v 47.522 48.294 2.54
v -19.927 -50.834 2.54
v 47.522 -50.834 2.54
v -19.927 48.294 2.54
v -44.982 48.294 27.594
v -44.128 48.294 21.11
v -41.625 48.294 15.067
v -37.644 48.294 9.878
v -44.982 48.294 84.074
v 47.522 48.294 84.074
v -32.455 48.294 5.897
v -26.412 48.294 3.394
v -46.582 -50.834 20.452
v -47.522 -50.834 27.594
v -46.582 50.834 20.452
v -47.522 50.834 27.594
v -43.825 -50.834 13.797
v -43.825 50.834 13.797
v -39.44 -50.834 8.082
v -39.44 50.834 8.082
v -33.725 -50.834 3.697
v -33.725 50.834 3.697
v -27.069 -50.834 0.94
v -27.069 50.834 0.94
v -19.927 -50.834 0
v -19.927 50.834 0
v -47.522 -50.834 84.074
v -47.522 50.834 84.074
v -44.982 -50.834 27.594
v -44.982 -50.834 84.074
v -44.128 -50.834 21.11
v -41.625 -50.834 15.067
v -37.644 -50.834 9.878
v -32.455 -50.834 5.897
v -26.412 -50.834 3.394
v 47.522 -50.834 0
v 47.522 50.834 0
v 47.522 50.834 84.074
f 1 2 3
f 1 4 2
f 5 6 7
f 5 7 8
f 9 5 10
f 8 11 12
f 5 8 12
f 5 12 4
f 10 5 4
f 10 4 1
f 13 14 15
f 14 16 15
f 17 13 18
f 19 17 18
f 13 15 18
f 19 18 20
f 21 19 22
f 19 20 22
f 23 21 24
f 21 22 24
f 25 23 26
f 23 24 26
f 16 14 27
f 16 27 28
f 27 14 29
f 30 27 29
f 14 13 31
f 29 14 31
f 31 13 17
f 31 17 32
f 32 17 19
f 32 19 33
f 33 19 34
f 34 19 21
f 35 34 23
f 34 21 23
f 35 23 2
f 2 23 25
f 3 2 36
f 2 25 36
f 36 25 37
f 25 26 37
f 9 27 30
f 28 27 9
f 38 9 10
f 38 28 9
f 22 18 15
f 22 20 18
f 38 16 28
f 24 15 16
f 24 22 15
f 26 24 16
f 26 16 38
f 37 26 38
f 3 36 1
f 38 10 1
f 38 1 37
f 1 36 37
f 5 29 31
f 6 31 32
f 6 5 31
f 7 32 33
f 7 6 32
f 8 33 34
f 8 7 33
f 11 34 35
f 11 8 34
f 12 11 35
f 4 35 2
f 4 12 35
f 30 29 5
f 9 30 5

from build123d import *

# Parameters (mm, degrees)
F0_W     = 95.043734
F0_H     = 101.66876
F1_DEPTH = 84.074
F2_R     = 27.594461
F3_T     = -2.54


with BuildPart() as f1:
    # F0 (on Top) → F1 (new body)
    with BuildSketch(Plane.XY):
        Rectangle(F0_W, F0_H)
    extrude(amount=F1_DEPTH)

    # F2
    f2_edges = [f1.edges().sort_by_distance(p)[0] for p in [
        (-47.521867, 0, 0),
    ]]
    fillet(f2_edges, radius=F2_R)

    # F3
    f3_openings = [f1.faces().sort_by_distance(p)[0] for p in [
        (0.863429, -50.83438, 42.785922),
        (0, 0, 84.074),
        (47.521867, 0, 42.037),
    ]]
    offset(amount=F3_T, openings=f3_openings)


solid = f1.part
